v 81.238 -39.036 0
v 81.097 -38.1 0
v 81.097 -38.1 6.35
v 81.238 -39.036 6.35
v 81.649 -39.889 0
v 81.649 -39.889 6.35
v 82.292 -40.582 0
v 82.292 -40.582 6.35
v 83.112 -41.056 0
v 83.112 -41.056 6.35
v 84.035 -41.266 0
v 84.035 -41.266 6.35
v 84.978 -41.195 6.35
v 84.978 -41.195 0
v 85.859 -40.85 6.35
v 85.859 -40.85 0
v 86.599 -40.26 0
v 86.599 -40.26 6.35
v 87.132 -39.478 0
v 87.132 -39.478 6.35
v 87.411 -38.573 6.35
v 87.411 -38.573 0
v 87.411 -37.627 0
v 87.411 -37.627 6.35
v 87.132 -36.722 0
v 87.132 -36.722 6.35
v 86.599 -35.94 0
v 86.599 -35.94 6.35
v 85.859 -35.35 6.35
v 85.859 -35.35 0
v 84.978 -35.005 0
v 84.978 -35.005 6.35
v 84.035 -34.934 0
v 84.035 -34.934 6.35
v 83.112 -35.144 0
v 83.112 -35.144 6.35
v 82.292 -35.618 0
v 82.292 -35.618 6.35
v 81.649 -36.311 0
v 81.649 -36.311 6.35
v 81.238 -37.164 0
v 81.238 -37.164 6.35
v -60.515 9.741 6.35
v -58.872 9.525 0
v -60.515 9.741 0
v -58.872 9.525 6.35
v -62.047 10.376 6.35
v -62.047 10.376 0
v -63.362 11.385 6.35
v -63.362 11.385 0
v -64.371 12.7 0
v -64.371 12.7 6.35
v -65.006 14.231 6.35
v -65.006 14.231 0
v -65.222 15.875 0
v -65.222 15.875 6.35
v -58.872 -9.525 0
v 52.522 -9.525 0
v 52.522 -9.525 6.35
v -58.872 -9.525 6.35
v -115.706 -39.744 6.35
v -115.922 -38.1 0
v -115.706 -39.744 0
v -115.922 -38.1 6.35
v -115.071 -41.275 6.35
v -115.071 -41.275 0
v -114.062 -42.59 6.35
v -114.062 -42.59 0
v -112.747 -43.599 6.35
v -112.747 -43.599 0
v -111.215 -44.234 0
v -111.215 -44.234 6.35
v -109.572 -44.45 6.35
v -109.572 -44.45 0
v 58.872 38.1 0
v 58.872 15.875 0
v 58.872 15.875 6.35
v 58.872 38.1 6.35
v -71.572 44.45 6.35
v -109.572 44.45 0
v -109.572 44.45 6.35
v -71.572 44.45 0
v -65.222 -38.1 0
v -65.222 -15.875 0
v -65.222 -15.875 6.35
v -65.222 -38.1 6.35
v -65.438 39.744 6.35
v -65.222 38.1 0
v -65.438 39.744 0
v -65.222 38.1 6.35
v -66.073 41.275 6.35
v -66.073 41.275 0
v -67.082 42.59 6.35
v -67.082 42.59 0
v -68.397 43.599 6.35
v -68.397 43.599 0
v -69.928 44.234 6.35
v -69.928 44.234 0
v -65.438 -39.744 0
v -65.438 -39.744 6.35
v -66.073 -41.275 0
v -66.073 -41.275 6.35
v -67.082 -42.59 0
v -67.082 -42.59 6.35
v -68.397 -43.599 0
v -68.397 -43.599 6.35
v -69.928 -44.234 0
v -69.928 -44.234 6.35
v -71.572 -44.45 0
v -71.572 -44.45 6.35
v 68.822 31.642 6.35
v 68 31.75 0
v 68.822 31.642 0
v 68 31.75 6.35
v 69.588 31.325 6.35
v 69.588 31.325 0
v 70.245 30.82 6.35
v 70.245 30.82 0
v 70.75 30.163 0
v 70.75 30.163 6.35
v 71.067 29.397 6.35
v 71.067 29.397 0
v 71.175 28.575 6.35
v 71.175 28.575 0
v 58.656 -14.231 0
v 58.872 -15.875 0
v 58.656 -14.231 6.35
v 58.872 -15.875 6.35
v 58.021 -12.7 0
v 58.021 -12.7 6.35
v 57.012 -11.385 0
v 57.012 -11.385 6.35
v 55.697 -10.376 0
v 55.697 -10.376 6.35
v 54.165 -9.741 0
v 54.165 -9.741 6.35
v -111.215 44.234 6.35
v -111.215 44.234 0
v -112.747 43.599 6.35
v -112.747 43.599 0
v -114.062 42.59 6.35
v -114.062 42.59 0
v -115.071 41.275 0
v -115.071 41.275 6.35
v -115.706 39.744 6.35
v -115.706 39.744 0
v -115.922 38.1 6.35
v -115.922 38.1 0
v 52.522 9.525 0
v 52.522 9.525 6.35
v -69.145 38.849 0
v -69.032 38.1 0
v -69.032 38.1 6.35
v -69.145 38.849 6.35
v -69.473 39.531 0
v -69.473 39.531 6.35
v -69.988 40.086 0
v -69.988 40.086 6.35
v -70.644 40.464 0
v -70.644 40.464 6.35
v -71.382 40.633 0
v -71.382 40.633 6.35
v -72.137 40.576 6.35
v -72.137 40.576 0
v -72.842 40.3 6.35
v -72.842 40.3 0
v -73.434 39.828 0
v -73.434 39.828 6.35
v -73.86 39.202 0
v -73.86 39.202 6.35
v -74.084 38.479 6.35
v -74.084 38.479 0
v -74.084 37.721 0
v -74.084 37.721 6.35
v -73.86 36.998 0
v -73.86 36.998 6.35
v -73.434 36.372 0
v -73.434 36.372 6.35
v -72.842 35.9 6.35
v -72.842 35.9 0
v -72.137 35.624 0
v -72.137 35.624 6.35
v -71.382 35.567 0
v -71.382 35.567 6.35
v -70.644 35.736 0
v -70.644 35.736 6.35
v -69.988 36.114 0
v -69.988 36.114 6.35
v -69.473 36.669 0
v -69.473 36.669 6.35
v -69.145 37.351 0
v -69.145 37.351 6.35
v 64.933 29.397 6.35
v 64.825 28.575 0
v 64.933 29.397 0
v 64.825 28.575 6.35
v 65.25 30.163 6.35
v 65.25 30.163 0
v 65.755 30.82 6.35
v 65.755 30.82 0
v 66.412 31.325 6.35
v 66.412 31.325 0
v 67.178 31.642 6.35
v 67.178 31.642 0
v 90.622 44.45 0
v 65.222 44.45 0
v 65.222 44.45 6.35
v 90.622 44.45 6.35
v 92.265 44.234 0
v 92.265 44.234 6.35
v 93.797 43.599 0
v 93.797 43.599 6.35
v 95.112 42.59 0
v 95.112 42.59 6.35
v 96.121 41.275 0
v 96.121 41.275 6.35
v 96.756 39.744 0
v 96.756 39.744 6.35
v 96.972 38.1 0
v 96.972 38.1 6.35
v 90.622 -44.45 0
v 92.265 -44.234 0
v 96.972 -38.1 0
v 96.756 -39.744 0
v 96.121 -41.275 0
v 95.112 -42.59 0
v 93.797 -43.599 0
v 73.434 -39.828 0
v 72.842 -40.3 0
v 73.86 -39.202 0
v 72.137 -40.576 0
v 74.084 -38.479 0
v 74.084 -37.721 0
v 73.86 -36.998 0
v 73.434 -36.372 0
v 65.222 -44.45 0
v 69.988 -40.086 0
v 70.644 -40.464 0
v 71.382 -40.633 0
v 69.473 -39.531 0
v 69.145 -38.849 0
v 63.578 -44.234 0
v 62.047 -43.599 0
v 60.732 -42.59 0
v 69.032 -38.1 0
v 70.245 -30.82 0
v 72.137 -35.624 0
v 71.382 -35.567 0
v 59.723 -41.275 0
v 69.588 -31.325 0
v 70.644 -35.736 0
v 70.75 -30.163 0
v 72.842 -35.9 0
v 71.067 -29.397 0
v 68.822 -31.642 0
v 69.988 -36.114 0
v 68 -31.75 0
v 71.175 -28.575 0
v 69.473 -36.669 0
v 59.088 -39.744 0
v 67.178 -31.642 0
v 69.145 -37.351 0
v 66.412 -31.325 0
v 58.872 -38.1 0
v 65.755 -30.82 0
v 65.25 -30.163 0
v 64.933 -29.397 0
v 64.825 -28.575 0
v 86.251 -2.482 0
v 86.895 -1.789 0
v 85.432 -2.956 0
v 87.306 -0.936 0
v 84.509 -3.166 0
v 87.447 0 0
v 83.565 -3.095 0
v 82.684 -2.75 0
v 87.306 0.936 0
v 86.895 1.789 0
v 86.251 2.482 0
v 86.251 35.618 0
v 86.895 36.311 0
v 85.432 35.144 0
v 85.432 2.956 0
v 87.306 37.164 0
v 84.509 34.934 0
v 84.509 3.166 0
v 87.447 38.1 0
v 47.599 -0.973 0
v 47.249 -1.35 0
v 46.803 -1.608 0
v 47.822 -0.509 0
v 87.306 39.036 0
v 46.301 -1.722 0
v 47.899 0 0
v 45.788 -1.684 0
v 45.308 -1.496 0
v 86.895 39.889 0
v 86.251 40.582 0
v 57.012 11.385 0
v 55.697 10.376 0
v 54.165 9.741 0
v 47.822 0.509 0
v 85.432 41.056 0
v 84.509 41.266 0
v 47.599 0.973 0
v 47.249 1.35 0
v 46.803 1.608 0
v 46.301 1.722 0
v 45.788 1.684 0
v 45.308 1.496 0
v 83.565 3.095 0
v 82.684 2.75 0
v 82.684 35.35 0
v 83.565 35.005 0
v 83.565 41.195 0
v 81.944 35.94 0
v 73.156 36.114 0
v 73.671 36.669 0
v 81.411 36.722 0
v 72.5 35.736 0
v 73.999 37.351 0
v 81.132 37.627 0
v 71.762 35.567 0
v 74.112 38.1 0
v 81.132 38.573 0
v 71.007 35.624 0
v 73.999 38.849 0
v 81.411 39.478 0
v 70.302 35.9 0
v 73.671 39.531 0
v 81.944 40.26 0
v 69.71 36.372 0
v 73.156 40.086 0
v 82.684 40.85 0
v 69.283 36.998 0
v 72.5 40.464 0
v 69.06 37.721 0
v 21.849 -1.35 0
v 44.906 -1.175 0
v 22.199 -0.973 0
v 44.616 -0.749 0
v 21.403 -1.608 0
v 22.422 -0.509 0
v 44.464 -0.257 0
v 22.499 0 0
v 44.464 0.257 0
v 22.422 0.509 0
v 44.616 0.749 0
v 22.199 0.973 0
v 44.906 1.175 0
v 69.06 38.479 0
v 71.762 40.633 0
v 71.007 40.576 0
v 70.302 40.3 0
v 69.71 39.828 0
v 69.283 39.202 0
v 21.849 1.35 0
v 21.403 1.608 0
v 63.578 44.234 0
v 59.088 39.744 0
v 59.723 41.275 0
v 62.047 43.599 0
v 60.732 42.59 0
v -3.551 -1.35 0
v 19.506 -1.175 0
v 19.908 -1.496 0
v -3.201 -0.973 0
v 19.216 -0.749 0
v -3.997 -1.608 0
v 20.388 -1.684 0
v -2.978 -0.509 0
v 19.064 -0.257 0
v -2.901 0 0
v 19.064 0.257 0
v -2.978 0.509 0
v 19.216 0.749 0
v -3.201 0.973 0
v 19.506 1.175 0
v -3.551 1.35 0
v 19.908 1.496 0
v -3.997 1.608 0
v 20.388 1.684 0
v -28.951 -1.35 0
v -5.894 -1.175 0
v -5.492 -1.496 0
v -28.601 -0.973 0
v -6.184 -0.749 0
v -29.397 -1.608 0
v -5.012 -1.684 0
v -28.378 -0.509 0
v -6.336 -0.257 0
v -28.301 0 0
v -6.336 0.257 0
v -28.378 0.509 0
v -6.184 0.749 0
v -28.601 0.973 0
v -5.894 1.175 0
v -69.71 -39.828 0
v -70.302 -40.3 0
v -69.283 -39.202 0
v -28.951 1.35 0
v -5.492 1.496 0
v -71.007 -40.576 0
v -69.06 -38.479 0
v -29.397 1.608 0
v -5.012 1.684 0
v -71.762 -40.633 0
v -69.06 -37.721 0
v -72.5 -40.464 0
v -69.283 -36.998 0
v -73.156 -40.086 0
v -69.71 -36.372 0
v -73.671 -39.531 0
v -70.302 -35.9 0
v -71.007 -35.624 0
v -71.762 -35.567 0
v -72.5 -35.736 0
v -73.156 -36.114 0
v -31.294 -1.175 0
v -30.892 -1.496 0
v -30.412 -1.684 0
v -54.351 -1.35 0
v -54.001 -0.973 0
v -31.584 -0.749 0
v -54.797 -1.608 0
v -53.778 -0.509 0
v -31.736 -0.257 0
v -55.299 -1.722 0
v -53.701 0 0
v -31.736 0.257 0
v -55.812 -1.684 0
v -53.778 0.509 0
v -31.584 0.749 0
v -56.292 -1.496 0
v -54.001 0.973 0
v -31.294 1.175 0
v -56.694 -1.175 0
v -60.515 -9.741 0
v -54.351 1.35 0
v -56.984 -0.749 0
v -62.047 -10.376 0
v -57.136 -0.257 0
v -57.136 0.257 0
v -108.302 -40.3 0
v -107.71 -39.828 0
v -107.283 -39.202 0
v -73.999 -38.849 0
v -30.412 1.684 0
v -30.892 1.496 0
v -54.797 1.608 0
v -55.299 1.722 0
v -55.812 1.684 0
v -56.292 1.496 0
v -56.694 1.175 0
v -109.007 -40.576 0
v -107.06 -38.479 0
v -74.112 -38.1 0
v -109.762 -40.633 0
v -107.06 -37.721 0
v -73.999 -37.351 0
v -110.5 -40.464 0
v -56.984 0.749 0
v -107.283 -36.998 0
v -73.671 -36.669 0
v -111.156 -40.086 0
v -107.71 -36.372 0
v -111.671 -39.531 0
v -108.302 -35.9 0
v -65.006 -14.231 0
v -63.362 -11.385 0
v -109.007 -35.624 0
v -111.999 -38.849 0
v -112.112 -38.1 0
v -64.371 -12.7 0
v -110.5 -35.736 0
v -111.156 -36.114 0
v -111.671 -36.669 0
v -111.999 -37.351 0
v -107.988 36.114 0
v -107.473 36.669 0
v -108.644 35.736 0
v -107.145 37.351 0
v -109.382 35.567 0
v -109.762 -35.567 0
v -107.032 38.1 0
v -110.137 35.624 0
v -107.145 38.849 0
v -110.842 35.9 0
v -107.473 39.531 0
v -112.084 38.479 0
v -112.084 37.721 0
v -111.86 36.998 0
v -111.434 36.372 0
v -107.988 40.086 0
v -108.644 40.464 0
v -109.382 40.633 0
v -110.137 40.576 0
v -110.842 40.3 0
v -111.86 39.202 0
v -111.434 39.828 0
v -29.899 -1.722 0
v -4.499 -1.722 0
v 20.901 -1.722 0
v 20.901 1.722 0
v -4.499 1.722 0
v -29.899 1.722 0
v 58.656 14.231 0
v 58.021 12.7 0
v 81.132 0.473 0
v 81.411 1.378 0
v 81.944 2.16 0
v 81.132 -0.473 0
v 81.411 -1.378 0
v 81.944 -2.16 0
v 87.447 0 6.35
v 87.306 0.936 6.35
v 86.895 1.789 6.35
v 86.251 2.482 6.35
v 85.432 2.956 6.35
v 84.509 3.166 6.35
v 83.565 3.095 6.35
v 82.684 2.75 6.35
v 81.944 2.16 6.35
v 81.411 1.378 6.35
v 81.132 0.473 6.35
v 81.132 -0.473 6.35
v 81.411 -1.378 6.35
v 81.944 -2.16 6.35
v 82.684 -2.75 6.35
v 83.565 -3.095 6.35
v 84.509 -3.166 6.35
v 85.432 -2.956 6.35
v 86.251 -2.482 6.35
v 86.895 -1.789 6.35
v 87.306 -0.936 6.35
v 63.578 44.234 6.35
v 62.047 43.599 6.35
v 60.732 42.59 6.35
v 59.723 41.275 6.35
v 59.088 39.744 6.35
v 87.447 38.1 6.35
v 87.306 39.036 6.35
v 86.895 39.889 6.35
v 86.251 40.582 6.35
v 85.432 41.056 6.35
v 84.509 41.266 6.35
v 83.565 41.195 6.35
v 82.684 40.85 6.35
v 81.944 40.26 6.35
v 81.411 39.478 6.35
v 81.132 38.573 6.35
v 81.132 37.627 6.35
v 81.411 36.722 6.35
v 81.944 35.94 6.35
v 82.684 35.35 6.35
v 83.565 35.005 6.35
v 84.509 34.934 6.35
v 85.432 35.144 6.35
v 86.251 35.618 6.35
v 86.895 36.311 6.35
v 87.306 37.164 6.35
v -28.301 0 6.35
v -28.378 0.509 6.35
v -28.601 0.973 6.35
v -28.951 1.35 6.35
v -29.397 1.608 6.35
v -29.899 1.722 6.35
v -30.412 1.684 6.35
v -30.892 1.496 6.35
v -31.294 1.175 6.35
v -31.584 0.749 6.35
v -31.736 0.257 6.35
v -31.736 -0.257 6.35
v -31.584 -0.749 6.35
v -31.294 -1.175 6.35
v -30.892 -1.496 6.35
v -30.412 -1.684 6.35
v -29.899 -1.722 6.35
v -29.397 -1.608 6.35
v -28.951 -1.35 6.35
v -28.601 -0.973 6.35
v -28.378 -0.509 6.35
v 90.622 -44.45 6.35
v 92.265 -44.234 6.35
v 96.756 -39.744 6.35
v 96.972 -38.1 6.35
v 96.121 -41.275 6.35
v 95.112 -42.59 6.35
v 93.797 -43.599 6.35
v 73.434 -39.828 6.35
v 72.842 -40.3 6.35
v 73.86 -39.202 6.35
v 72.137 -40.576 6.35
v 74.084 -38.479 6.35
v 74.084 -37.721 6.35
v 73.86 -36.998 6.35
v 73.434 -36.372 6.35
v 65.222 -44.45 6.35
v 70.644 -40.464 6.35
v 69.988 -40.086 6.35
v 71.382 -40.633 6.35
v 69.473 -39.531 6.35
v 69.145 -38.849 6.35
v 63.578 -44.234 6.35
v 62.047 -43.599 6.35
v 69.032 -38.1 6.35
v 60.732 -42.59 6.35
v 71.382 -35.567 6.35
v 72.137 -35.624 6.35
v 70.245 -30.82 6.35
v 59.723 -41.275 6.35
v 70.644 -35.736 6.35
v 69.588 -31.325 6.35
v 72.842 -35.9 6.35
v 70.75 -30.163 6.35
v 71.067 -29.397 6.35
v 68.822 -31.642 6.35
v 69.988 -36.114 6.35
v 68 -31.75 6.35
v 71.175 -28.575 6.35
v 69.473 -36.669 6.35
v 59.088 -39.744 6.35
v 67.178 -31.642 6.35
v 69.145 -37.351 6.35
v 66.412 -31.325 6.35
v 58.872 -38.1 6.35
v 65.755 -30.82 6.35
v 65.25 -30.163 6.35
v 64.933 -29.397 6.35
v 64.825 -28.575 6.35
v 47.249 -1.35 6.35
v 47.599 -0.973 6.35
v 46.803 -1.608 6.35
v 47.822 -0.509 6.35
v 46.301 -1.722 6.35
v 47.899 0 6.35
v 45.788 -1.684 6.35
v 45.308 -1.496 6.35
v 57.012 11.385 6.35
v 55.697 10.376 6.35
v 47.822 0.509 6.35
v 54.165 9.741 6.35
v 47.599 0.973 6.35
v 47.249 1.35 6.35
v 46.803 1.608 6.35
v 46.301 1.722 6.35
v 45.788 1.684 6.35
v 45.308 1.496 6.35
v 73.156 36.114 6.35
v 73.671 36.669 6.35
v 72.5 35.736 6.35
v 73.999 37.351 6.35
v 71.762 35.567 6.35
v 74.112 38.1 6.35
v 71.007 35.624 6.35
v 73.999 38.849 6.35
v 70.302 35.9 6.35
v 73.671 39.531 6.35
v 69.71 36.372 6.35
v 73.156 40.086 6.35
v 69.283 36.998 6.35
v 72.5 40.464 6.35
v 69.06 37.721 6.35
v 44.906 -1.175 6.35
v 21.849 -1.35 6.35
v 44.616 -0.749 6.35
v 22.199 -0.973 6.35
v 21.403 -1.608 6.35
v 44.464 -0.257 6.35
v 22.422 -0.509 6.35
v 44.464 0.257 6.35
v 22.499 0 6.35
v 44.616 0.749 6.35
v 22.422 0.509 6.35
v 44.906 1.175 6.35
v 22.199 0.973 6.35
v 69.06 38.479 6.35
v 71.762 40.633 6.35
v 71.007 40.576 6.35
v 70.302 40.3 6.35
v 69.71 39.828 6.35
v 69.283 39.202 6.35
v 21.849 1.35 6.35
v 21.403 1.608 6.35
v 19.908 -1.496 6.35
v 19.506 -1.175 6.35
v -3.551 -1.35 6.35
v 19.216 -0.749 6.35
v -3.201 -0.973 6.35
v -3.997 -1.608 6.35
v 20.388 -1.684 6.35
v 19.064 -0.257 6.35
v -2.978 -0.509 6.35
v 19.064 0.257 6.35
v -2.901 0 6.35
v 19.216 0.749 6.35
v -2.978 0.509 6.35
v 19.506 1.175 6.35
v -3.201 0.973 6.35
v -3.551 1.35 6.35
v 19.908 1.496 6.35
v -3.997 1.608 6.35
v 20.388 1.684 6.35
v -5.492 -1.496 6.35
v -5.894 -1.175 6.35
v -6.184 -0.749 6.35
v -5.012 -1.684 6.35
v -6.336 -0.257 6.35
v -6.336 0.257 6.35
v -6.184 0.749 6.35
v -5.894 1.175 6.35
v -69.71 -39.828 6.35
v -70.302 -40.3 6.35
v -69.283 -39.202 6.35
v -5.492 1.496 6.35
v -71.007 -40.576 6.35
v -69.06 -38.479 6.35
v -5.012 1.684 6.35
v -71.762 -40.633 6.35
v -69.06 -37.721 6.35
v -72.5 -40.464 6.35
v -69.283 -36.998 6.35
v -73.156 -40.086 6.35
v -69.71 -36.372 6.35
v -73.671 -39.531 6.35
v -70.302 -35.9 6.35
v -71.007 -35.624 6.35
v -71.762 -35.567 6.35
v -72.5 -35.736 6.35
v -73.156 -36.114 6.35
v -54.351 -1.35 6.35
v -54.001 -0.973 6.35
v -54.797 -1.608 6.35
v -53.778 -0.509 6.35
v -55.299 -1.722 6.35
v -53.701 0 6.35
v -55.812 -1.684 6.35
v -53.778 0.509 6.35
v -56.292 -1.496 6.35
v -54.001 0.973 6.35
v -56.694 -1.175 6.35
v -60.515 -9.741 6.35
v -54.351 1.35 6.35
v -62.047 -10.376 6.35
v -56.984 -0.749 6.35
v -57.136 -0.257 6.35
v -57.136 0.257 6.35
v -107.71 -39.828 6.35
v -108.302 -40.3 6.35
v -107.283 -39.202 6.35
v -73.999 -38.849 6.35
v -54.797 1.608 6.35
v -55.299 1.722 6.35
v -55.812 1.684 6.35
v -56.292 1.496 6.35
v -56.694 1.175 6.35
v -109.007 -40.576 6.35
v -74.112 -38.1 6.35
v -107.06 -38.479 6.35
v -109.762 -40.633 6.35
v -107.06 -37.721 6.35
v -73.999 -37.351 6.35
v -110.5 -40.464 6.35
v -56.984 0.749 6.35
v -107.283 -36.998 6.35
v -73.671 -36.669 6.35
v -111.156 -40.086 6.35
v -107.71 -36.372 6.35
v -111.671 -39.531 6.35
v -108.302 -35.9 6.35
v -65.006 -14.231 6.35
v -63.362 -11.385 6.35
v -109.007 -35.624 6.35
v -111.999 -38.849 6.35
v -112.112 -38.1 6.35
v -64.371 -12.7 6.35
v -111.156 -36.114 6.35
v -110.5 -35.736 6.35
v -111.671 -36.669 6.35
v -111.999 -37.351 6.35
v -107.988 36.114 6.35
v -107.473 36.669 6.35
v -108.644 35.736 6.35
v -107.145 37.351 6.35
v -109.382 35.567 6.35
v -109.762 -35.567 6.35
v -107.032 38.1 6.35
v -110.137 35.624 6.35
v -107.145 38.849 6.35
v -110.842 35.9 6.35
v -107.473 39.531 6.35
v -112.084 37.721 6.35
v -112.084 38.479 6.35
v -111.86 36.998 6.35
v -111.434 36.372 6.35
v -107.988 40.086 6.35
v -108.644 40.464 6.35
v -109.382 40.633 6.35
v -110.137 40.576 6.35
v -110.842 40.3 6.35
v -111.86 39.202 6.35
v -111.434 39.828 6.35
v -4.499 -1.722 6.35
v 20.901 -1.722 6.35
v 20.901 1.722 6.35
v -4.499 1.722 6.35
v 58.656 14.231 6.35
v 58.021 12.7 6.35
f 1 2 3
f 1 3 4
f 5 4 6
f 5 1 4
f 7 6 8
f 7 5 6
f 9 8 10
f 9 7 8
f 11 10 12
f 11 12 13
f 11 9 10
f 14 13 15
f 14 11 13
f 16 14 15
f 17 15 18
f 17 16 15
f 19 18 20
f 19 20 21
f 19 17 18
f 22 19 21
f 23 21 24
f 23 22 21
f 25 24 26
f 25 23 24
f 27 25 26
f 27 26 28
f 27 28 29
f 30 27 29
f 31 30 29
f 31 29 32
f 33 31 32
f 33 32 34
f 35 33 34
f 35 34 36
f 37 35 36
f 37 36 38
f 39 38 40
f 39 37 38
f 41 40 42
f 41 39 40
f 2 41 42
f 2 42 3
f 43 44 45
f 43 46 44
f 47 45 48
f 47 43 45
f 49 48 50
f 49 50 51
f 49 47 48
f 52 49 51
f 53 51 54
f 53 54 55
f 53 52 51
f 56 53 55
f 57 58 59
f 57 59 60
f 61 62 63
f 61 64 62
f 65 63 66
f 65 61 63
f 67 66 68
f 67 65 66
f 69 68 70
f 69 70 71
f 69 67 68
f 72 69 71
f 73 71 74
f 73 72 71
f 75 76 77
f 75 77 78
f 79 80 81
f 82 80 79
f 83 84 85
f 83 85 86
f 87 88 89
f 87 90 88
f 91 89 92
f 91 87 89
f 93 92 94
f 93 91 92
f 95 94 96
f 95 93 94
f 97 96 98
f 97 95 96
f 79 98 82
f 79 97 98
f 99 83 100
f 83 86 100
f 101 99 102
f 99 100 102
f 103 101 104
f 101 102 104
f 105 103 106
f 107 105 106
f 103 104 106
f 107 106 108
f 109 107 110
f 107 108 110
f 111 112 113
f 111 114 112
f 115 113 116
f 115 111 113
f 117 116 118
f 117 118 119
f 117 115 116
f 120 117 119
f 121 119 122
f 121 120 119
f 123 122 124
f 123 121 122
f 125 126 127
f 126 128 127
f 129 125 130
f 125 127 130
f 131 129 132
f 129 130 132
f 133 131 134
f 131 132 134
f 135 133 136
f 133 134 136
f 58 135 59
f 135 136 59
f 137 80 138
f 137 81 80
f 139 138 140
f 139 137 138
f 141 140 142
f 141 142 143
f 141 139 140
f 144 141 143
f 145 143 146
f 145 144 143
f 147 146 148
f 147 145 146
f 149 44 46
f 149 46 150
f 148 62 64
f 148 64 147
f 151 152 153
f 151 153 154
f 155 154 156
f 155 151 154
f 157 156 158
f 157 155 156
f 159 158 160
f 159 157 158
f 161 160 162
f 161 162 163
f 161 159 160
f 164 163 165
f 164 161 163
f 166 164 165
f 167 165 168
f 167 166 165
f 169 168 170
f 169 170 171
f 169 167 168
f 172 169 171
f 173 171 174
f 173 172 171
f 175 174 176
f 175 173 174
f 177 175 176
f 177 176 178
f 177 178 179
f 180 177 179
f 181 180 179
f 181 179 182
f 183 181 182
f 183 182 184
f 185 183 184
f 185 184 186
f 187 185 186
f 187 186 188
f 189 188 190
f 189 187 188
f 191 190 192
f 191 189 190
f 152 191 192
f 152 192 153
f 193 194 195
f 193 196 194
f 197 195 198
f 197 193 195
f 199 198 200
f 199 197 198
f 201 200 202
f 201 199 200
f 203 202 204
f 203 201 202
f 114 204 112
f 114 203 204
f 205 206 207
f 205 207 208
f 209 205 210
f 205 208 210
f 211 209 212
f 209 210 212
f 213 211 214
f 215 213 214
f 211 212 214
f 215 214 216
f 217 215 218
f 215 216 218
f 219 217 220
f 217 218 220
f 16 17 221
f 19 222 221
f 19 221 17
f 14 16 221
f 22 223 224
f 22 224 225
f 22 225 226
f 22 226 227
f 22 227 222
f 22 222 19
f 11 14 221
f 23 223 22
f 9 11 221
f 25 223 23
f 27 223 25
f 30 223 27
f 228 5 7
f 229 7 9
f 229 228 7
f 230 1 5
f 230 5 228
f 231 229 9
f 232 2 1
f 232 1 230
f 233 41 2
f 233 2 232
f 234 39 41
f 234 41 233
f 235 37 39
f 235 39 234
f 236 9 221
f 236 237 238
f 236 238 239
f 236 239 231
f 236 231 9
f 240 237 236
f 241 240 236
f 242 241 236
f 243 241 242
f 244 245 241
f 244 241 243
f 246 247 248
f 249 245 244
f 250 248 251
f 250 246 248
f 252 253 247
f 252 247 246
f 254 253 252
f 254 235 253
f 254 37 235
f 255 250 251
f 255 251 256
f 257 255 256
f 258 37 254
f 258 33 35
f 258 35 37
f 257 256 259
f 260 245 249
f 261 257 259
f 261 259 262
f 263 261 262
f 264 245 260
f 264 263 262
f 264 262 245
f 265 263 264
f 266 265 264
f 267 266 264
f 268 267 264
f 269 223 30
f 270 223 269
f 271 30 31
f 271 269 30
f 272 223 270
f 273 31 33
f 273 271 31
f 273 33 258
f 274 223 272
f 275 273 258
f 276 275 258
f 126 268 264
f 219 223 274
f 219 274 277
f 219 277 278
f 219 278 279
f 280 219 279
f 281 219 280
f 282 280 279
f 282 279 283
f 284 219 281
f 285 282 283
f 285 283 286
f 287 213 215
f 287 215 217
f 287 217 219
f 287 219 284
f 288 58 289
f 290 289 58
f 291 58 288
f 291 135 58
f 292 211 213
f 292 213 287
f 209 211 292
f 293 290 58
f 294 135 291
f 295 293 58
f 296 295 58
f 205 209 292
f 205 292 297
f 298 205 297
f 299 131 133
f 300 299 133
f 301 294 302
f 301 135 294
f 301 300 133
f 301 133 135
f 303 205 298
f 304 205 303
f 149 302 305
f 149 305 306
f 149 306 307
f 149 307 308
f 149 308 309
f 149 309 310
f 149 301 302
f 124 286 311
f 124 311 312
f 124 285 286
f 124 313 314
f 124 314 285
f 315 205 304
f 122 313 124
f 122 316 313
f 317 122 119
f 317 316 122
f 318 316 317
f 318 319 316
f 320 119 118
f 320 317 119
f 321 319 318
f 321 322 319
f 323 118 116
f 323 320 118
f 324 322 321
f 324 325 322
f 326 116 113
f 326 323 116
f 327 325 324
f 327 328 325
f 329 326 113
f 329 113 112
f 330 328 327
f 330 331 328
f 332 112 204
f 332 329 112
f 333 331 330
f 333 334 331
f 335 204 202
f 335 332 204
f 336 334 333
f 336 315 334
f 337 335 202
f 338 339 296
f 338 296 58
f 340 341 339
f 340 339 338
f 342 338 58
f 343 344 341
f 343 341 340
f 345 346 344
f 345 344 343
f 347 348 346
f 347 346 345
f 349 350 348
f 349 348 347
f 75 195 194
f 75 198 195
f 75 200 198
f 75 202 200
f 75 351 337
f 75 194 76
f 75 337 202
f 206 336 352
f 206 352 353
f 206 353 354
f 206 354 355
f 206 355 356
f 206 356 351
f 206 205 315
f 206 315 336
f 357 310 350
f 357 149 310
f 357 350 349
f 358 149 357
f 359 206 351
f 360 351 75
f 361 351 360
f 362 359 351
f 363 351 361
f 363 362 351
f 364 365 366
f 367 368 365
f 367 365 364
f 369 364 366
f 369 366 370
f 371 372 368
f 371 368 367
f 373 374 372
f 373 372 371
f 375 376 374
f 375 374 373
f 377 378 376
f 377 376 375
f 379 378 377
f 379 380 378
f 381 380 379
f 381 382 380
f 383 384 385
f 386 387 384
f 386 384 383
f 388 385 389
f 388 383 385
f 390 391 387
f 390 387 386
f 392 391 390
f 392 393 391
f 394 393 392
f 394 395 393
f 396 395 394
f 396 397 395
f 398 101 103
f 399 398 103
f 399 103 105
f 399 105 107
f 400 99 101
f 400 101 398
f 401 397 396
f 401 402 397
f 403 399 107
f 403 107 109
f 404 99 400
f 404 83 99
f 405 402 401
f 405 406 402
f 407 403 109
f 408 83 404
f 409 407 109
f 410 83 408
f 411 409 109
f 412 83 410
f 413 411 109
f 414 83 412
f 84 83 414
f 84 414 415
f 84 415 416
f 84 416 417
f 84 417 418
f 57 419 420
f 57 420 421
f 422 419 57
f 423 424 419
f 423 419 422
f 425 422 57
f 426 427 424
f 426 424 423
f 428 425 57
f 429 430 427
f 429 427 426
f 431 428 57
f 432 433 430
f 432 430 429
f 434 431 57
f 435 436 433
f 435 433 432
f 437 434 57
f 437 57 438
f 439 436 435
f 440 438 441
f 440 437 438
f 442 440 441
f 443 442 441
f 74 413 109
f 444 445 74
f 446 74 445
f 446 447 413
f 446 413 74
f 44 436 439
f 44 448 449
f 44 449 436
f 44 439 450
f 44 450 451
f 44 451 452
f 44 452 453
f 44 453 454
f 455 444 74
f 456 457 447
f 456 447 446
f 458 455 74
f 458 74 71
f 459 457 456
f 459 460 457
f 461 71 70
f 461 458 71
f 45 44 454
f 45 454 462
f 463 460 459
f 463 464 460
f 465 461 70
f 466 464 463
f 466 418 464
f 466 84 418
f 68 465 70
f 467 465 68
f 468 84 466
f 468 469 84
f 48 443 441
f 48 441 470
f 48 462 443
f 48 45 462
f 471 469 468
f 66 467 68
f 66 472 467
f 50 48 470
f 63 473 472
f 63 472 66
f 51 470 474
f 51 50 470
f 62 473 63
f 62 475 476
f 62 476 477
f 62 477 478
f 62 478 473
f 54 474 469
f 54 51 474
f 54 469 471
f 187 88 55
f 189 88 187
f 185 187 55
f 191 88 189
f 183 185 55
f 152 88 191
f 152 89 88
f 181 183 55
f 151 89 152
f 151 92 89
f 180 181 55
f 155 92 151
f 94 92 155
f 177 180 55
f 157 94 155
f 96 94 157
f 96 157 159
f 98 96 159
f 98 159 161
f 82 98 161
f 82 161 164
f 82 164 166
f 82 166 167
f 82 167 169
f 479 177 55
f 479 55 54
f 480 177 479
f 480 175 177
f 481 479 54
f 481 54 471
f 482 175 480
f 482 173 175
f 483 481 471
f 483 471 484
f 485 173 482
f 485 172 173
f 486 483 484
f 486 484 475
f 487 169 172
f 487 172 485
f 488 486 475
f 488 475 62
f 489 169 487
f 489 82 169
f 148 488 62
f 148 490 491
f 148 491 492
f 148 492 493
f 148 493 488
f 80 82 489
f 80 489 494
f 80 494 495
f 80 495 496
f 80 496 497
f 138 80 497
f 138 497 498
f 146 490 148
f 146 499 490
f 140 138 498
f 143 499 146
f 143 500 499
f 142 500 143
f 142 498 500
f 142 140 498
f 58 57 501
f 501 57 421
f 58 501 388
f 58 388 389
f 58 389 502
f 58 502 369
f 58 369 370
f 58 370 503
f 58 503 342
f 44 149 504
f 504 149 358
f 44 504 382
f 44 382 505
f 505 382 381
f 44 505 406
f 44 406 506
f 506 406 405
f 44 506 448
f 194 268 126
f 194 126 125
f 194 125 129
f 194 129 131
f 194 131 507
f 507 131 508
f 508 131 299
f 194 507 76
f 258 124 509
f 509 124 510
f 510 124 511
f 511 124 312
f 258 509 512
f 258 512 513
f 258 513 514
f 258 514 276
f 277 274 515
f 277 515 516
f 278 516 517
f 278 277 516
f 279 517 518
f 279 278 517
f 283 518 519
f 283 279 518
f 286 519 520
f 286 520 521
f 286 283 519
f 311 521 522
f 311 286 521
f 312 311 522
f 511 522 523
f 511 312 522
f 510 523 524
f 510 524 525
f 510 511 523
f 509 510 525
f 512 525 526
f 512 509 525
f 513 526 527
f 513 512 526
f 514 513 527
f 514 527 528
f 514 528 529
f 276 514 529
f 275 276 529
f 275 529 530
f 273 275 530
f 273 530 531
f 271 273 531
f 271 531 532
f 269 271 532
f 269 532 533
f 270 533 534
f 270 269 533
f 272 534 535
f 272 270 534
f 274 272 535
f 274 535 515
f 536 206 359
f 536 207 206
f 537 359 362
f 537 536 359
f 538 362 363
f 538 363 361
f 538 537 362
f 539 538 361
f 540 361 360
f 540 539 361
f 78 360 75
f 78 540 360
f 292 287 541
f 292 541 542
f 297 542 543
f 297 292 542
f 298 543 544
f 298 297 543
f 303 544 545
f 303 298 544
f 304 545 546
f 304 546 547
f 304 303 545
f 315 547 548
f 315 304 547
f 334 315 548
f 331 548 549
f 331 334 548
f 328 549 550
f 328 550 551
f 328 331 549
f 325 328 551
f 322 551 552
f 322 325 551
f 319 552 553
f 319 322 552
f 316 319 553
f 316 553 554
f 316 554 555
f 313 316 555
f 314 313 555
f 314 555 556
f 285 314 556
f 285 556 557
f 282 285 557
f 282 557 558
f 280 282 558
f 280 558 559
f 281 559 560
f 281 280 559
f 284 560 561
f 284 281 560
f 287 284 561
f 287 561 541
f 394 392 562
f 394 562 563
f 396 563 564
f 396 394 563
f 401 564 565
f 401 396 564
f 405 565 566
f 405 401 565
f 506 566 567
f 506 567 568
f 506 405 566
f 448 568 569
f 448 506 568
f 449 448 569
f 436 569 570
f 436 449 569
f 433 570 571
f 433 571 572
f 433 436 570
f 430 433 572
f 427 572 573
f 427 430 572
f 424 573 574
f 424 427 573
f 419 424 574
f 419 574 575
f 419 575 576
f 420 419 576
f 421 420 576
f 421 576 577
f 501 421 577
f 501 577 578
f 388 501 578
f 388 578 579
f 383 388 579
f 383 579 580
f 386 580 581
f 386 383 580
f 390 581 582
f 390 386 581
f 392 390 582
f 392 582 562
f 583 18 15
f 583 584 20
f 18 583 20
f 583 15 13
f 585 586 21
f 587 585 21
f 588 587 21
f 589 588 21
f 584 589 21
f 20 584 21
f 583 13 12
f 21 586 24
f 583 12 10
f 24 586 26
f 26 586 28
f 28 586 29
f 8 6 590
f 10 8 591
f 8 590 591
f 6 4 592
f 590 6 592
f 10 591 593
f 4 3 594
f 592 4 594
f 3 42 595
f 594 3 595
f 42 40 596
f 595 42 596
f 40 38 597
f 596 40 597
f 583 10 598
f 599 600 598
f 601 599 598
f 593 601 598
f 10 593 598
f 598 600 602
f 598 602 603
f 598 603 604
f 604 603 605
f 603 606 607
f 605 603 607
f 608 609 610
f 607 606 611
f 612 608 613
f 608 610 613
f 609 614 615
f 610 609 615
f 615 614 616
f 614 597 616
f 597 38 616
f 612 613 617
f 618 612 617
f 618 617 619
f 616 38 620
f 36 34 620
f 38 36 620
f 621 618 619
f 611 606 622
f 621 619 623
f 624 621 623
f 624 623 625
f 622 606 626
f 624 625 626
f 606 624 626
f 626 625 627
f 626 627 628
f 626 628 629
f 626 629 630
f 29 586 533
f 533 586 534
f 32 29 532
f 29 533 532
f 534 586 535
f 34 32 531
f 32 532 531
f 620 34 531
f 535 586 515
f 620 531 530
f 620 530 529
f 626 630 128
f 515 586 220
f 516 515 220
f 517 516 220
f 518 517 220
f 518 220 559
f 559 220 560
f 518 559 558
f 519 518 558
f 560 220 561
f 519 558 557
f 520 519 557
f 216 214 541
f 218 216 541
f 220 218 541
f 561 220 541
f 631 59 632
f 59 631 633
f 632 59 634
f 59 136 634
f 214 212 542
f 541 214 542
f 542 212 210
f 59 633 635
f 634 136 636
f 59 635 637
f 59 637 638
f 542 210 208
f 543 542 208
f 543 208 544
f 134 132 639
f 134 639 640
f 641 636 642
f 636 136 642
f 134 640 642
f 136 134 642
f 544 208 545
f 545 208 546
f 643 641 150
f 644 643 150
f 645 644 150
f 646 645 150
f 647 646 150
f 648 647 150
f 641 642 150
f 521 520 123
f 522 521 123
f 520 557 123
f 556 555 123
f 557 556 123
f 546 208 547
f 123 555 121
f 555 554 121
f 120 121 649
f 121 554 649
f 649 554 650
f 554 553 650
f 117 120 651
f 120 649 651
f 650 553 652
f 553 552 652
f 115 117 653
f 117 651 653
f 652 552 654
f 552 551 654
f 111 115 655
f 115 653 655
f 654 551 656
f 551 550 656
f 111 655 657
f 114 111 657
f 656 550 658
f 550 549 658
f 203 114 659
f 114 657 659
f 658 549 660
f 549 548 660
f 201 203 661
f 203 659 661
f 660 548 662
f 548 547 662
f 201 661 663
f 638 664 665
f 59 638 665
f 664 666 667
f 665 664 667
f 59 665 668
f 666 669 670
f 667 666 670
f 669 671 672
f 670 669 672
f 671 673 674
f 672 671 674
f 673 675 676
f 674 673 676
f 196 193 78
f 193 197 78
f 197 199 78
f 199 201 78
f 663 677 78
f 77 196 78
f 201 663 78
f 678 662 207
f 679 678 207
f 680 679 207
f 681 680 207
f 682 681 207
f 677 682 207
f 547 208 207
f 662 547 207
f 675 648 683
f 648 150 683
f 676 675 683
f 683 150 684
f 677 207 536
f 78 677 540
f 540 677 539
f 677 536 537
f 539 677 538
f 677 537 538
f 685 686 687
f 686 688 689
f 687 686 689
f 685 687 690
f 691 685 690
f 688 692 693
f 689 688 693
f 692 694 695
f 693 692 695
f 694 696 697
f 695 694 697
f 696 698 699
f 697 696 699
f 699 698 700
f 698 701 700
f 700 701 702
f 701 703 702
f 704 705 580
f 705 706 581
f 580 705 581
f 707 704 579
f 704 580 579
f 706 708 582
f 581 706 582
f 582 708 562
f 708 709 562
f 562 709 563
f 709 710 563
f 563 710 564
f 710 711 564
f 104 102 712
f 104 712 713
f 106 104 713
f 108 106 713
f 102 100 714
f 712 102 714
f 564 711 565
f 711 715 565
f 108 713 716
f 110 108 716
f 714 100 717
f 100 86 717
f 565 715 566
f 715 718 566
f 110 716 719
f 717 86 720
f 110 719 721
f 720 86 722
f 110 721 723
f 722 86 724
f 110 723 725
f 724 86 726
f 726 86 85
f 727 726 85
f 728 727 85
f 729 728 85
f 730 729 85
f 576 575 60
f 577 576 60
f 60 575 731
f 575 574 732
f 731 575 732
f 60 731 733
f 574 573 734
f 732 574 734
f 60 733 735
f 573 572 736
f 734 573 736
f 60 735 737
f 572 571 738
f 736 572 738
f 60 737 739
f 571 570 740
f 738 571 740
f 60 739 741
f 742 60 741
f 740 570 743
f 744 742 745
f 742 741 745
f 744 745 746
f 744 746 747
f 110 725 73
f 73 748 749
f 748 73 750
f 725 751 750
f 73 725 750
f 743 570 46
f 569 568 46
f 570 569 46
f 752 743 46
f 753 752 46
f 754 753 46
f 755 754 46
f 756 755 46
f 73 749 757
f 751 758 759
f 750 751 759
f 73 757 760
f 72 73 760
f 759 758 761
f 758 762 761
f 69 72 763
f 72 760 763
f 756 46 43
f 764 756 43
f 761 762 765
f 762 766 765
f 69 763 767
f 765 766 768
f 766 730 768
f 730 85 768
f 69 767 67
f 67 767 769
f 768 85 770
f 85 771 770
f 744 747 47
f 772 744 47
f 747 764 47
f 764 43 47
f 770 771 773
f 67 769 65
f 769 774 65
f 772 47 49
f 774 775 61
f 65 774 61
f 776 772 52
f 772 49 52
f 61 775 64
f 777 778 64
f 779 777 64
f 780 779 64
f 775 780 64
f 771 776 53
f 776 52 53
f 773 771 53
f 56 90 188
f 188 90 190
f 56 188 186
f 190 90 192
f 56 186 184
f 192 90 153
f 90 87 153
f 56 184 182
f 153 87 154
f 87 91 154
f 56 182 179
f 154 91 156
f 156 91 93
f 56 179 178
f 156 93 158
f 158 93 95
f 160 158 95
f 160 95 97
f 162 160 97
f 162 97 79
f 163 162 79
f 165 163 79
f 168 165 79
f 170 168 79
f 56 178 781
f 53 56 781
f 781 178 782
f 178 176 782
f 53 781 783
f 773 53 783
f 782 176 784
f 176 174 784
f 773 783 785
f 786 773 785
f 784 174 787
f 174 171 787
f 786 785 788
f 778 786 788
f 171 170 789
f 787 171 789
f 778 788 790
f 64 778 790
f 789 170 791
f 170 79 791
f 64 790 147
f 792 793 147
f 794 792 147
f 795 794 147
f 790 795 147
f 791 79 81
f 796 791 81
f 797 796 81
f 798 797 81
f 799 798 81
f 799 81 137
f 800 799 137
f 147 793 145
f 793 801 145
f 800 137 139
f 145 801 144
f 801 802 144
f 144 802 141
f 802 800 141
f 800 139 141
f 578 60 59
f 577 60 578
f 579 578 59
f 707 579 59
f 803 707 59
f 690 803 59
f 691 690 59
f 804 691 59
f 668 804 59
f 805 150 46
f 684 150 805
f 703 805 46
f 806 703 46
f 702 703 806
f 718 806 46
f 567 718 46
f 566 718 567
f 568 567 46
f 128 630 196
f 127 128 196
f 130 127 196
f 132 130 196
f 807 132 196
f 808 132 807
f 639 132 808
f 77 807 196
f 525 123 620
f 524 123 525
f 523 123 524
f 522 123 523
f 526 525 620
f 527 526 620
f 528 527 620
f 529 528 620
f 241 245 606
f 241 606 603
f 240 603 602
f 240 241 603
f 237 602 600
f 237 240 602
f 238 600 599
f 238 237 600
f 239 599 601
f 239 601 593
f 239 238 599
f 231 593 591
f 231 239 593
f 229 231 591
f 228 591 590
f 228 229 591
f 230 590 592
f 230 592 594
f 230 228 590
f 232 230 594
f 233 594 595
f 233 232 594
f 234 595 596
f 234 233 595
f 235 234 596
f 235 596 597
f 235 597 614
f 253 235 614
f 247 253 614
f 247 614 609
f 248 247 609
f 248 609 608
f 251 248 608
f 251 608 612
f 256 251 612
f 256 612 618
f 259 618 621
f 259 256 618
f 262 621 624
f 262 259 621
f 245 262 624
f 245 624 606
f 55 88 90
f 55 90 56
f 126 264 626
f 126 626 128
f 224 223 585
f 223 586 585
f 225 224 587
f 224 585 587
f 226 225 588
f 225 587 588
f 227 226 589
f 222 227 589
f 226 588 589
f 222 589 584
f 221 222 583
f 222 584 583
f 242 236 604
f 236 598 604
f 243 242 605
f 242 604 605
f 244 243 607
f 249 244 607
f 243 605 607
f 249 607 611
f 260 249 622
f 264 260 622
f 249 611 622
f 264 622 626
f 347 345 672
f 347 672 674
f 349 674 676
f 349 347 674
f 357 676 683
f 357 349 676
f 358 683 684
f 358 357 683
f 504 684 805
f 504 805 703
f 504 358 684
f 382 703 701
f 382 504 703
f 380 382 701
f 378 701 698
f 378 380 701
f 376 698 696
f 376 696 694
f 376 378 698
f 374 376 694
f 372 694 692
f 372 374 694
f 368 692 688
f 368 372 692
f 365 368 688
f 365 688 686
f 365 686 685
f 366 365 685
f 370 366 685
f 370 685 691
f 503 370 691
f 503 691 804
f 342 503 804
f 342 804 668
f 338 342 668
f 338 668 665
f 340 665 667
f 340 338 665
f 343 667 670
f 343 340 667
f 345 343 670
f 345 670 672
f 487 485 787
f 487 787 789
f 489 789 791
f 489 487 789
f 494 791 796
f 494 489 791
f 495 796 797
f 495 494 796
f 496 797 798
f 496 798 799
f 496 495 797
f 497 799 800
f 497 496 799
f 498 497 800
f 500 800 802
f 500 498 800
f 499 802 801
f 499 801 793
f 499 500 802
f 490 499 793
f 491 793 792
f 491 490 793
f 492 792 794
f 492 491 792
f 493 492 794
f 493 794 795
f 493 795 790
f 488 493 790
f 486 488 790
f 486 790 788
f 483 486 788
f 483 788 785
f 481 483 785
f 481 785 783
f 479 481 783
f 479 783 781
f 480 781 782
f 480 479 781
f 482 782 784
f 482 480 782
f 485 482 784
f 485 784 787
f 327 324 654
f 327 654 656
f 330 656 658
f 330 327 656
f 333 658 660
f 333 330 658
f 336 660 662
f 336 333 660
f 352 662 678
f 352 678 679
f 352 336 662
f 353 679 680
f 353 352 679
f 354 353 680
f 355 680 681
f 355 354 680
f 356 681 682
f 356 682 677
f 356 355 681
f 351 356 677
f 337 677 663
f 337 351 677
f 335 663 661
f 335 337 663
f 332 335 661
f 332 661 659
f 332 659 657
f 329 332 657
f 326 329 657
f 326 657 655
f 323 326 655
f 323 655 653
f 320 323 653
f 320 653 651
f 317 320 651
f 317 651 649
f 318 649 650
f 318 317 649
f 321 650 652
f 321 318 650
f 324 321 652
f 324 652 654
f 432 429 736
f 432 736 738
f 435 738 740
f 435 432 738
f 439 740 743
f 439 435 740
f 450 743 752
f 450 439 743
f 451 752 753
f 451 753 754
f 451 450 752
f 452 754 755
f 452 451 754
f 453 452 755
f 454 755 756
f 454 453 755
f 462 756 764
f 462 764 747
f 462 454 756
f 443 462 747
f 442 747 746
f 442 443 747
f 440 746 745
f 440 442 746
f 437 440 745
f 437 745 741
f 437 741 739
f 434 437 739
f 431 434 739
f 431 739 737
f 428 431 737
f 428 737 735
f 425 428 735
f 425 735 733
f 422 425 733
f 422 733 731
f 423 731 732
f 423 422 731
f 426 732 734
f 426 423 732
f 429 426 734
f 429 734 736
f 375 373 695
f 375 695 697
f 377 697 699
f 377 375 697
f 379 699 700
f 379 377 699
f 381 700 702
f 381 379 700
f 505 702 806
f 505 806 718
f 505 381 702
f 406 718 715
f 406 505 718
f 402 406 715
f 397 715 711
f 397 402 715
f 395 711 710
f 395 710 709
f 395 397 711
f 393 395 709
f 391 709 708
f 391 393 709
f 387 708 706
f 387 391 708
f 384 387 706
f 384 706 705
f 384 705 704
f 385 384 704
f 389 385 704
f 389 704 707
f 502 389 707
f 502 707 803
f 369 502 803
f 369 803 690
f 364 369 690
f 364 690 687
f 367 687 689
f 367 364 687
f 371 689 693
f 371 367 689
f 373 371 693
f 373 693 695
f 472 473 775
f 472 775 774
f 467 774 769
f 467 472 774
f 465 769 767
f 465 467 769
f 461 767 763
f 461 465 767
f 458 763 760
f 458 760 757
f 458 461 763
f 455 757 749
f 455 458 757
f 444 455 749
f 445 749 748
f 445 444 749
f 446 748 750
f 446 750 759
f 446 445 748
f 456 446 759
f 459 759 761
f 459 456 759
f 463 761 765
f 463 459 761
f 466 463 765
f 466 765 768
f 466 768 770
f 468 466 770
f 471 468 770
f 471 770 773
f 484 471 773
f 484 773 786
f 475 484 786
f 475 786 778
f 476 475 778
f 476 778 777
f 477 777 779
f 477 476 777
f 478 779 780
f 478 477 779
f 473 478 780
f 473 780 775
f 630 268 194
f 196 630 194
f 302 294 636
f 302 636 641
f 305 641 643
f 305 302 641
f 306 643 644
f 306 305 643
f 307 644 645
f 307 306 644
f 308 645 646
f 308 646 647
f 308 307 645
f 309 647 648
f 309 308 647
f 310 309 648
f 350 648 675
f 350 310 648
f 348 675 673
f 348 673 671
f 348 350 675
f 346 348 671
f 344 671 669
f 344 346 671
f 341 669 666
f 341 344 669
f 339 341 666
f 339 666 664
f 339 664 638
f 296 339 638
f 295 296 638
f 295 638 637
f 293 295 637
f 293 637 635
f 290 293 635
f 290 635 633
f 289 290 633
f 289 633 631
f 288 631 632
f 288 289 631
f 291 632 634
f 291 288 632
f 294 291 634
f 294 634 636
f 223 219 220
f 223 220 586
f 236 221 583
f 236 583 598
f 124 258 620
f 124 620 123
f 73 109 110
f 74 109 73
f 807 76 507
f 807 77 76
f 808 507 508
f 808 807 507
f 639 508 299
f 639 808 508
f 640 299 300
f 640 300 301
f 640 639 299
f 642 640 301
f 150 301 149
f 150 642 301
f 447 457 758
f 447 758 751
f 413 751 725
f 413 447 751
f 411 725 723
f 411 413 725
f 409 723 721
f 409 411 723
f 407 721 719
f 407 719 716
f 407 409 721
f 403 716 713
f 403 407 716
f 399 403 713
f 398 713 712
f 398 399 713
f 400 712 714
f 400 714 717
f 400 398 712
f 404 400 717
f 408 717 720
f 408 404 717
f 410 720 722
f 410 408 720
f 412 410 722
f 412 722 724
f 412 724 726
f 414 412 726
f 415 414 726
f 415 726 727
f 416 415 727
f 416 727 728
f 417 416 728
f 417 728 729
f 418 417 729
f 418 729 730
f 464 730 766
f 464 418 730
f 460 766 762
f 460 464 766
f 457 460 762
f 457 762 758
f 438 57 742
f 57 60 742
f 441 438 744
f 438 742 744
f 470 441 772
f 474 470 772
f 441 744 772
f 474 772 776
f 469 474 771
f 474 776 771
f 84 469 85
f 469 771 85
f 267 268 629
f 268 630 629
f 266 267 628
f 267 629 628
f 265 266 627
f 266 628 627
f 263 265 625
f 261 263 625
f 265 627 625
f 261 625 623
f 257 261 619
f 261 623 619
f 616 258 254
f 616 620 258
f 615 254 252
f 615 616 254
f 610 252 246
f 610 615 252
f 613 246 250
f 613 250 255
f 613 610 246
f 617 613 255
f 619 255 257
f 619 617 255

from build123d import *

# Parameters (mm, degrees)
SKETCH4_R           = 2.54
SKETCH4_R_2         = 3.175
SKETCH4_R_3         = 1.7272
SKETCH4_W           = 6.35
SKETCH4_H           = 63.5
BOSS_EXTRUDE4_DEPTH = 6.35
FILLET1_R           = 6.35
FILLET2_R           = 3.175


with BuildPart() as part:
    # Sketch4 → Boss-Extrude4 (new body)
    with BuildSketch(Plane.XY):
        Polygon((58.871875, 44.45), (96.971875, 44.45), (96.971875, -44.45), (58.871875, -44.45), (58.871875, -9.525), (-65.221875, -9.525), (-65.221875, -44.45), (-115.921875, -44.45), (-115.921875, 44.45), (-65.221875, 44.45), (-65.221875, 9.525), (58.871875, 9.525), align=None)
        with Locations((-109.571875, 38.1)):
            Circle(SKETCH4_R, mode=Mode.SUBTRACT)
        with Locations((84.271875, 38.1)):
            Circle(SKETCH4_R_2, mode=Mode.SUBTRACT)
        with Locations((46.171875, 0)):
            Circle(SKETCH4_R_3, mode=Mode.SUBTRACT)
        with Locations((20.771875, 0)):
            Circle(SKETCH4_R_3, mode=Mode.SUBTRACT)
        with Locations((-4.628125, 0)):
            Circle(SKETCH4_R_3, mode=Mode.SUBTRACT)
        with Locations((-30.028125, 0)):
            Circle(SKETCH4_R_3, mode=Mode.SUBTRACT)
        with Locations((71.571875, 38.1)):
            Circle(SKETCH4_R, mode=Mode.SUBTRACT)
        with Locations((-71.571875, 38.1)):
            Circle(SKETCH4_R, mode=Mode.SUBTRACT)
        with Locations(Location((84.271875, -38.1, 0), (0, 0, 180))):
            Circle(SKETCH4_R_2, mode=Mode.SUBTRACT)
        with Locations(Location((71.571875, -38.1, 0), (0, 0, 180))):
            Circle(SKETCH4_R, mode=Mode.SUBTRACT)
        with Locations(Location((-71.571875, -38.1, 0), (0, 0, 180))):
            Circle(SKETCH4_R, mode=Mode.SUBTRACT)
        with Locations(Location((-109.571875, -38.1, 0), (0, 0, 180))):
            Circle(SKETCH4_R, mode=Mode.SUBTRACT)
        with Locations((84.271875, 0)):
            Circle(SKETCH4_R_2, mode=Mode.SUBTRACT)
        with Locations((-55.428125, 0)):
            Circle(SKETCH4_R_3, mode=Mode.SUBTRACT)
        with Locations((68, 0)):
            Rectangle(SKETCH4_W, SKETCH4_H, mode=Mode.SUBTRACT)
    extrude(amount=BOSS_EXTRUDE4_DEPTH)

    # Fillet1
    fillet1_edges = [part.edges().sort_by_distance(p)[0] for p in [
        (58.871875, -9.525, 3.175),
        (-65.221875, -9.525, 3.175),
        (-65.221875, -44.45, 3.175),
        (-115.921875, -44.45, 3.175),
        (-115.921875, 44.45, 3.175),
        (-65.221875, 44.45, 3.175),
        (-65.221875, 9.525, 3.175),
        (58.871875, 9.525, 3.175),
        (58.871875, 44.45, 3.175),
        (96.971875, 44.45, 3.175),
        (96.971875, -44.45, 3.175),
        (58.871875, -44.45, 3.175),
    ]]
    fillet(fillet1_edges, radius=FILLET1_R)

    # Fillet2
    fillet2_edges = [part.edges().sort_by_distance(p)[0] for p in [
        (71.175, 31.75, 3.175),
        (64.825, 31.75, 3.175),
        (71.175, -31.75, 3.175),
        (64.825, -31.75, 3.175),
    ]]
    fillet(fillet2_edges, radius=FILLET2_R - 0.0001)  # a hair under: the kernel refuses the full size


solid = part.part
